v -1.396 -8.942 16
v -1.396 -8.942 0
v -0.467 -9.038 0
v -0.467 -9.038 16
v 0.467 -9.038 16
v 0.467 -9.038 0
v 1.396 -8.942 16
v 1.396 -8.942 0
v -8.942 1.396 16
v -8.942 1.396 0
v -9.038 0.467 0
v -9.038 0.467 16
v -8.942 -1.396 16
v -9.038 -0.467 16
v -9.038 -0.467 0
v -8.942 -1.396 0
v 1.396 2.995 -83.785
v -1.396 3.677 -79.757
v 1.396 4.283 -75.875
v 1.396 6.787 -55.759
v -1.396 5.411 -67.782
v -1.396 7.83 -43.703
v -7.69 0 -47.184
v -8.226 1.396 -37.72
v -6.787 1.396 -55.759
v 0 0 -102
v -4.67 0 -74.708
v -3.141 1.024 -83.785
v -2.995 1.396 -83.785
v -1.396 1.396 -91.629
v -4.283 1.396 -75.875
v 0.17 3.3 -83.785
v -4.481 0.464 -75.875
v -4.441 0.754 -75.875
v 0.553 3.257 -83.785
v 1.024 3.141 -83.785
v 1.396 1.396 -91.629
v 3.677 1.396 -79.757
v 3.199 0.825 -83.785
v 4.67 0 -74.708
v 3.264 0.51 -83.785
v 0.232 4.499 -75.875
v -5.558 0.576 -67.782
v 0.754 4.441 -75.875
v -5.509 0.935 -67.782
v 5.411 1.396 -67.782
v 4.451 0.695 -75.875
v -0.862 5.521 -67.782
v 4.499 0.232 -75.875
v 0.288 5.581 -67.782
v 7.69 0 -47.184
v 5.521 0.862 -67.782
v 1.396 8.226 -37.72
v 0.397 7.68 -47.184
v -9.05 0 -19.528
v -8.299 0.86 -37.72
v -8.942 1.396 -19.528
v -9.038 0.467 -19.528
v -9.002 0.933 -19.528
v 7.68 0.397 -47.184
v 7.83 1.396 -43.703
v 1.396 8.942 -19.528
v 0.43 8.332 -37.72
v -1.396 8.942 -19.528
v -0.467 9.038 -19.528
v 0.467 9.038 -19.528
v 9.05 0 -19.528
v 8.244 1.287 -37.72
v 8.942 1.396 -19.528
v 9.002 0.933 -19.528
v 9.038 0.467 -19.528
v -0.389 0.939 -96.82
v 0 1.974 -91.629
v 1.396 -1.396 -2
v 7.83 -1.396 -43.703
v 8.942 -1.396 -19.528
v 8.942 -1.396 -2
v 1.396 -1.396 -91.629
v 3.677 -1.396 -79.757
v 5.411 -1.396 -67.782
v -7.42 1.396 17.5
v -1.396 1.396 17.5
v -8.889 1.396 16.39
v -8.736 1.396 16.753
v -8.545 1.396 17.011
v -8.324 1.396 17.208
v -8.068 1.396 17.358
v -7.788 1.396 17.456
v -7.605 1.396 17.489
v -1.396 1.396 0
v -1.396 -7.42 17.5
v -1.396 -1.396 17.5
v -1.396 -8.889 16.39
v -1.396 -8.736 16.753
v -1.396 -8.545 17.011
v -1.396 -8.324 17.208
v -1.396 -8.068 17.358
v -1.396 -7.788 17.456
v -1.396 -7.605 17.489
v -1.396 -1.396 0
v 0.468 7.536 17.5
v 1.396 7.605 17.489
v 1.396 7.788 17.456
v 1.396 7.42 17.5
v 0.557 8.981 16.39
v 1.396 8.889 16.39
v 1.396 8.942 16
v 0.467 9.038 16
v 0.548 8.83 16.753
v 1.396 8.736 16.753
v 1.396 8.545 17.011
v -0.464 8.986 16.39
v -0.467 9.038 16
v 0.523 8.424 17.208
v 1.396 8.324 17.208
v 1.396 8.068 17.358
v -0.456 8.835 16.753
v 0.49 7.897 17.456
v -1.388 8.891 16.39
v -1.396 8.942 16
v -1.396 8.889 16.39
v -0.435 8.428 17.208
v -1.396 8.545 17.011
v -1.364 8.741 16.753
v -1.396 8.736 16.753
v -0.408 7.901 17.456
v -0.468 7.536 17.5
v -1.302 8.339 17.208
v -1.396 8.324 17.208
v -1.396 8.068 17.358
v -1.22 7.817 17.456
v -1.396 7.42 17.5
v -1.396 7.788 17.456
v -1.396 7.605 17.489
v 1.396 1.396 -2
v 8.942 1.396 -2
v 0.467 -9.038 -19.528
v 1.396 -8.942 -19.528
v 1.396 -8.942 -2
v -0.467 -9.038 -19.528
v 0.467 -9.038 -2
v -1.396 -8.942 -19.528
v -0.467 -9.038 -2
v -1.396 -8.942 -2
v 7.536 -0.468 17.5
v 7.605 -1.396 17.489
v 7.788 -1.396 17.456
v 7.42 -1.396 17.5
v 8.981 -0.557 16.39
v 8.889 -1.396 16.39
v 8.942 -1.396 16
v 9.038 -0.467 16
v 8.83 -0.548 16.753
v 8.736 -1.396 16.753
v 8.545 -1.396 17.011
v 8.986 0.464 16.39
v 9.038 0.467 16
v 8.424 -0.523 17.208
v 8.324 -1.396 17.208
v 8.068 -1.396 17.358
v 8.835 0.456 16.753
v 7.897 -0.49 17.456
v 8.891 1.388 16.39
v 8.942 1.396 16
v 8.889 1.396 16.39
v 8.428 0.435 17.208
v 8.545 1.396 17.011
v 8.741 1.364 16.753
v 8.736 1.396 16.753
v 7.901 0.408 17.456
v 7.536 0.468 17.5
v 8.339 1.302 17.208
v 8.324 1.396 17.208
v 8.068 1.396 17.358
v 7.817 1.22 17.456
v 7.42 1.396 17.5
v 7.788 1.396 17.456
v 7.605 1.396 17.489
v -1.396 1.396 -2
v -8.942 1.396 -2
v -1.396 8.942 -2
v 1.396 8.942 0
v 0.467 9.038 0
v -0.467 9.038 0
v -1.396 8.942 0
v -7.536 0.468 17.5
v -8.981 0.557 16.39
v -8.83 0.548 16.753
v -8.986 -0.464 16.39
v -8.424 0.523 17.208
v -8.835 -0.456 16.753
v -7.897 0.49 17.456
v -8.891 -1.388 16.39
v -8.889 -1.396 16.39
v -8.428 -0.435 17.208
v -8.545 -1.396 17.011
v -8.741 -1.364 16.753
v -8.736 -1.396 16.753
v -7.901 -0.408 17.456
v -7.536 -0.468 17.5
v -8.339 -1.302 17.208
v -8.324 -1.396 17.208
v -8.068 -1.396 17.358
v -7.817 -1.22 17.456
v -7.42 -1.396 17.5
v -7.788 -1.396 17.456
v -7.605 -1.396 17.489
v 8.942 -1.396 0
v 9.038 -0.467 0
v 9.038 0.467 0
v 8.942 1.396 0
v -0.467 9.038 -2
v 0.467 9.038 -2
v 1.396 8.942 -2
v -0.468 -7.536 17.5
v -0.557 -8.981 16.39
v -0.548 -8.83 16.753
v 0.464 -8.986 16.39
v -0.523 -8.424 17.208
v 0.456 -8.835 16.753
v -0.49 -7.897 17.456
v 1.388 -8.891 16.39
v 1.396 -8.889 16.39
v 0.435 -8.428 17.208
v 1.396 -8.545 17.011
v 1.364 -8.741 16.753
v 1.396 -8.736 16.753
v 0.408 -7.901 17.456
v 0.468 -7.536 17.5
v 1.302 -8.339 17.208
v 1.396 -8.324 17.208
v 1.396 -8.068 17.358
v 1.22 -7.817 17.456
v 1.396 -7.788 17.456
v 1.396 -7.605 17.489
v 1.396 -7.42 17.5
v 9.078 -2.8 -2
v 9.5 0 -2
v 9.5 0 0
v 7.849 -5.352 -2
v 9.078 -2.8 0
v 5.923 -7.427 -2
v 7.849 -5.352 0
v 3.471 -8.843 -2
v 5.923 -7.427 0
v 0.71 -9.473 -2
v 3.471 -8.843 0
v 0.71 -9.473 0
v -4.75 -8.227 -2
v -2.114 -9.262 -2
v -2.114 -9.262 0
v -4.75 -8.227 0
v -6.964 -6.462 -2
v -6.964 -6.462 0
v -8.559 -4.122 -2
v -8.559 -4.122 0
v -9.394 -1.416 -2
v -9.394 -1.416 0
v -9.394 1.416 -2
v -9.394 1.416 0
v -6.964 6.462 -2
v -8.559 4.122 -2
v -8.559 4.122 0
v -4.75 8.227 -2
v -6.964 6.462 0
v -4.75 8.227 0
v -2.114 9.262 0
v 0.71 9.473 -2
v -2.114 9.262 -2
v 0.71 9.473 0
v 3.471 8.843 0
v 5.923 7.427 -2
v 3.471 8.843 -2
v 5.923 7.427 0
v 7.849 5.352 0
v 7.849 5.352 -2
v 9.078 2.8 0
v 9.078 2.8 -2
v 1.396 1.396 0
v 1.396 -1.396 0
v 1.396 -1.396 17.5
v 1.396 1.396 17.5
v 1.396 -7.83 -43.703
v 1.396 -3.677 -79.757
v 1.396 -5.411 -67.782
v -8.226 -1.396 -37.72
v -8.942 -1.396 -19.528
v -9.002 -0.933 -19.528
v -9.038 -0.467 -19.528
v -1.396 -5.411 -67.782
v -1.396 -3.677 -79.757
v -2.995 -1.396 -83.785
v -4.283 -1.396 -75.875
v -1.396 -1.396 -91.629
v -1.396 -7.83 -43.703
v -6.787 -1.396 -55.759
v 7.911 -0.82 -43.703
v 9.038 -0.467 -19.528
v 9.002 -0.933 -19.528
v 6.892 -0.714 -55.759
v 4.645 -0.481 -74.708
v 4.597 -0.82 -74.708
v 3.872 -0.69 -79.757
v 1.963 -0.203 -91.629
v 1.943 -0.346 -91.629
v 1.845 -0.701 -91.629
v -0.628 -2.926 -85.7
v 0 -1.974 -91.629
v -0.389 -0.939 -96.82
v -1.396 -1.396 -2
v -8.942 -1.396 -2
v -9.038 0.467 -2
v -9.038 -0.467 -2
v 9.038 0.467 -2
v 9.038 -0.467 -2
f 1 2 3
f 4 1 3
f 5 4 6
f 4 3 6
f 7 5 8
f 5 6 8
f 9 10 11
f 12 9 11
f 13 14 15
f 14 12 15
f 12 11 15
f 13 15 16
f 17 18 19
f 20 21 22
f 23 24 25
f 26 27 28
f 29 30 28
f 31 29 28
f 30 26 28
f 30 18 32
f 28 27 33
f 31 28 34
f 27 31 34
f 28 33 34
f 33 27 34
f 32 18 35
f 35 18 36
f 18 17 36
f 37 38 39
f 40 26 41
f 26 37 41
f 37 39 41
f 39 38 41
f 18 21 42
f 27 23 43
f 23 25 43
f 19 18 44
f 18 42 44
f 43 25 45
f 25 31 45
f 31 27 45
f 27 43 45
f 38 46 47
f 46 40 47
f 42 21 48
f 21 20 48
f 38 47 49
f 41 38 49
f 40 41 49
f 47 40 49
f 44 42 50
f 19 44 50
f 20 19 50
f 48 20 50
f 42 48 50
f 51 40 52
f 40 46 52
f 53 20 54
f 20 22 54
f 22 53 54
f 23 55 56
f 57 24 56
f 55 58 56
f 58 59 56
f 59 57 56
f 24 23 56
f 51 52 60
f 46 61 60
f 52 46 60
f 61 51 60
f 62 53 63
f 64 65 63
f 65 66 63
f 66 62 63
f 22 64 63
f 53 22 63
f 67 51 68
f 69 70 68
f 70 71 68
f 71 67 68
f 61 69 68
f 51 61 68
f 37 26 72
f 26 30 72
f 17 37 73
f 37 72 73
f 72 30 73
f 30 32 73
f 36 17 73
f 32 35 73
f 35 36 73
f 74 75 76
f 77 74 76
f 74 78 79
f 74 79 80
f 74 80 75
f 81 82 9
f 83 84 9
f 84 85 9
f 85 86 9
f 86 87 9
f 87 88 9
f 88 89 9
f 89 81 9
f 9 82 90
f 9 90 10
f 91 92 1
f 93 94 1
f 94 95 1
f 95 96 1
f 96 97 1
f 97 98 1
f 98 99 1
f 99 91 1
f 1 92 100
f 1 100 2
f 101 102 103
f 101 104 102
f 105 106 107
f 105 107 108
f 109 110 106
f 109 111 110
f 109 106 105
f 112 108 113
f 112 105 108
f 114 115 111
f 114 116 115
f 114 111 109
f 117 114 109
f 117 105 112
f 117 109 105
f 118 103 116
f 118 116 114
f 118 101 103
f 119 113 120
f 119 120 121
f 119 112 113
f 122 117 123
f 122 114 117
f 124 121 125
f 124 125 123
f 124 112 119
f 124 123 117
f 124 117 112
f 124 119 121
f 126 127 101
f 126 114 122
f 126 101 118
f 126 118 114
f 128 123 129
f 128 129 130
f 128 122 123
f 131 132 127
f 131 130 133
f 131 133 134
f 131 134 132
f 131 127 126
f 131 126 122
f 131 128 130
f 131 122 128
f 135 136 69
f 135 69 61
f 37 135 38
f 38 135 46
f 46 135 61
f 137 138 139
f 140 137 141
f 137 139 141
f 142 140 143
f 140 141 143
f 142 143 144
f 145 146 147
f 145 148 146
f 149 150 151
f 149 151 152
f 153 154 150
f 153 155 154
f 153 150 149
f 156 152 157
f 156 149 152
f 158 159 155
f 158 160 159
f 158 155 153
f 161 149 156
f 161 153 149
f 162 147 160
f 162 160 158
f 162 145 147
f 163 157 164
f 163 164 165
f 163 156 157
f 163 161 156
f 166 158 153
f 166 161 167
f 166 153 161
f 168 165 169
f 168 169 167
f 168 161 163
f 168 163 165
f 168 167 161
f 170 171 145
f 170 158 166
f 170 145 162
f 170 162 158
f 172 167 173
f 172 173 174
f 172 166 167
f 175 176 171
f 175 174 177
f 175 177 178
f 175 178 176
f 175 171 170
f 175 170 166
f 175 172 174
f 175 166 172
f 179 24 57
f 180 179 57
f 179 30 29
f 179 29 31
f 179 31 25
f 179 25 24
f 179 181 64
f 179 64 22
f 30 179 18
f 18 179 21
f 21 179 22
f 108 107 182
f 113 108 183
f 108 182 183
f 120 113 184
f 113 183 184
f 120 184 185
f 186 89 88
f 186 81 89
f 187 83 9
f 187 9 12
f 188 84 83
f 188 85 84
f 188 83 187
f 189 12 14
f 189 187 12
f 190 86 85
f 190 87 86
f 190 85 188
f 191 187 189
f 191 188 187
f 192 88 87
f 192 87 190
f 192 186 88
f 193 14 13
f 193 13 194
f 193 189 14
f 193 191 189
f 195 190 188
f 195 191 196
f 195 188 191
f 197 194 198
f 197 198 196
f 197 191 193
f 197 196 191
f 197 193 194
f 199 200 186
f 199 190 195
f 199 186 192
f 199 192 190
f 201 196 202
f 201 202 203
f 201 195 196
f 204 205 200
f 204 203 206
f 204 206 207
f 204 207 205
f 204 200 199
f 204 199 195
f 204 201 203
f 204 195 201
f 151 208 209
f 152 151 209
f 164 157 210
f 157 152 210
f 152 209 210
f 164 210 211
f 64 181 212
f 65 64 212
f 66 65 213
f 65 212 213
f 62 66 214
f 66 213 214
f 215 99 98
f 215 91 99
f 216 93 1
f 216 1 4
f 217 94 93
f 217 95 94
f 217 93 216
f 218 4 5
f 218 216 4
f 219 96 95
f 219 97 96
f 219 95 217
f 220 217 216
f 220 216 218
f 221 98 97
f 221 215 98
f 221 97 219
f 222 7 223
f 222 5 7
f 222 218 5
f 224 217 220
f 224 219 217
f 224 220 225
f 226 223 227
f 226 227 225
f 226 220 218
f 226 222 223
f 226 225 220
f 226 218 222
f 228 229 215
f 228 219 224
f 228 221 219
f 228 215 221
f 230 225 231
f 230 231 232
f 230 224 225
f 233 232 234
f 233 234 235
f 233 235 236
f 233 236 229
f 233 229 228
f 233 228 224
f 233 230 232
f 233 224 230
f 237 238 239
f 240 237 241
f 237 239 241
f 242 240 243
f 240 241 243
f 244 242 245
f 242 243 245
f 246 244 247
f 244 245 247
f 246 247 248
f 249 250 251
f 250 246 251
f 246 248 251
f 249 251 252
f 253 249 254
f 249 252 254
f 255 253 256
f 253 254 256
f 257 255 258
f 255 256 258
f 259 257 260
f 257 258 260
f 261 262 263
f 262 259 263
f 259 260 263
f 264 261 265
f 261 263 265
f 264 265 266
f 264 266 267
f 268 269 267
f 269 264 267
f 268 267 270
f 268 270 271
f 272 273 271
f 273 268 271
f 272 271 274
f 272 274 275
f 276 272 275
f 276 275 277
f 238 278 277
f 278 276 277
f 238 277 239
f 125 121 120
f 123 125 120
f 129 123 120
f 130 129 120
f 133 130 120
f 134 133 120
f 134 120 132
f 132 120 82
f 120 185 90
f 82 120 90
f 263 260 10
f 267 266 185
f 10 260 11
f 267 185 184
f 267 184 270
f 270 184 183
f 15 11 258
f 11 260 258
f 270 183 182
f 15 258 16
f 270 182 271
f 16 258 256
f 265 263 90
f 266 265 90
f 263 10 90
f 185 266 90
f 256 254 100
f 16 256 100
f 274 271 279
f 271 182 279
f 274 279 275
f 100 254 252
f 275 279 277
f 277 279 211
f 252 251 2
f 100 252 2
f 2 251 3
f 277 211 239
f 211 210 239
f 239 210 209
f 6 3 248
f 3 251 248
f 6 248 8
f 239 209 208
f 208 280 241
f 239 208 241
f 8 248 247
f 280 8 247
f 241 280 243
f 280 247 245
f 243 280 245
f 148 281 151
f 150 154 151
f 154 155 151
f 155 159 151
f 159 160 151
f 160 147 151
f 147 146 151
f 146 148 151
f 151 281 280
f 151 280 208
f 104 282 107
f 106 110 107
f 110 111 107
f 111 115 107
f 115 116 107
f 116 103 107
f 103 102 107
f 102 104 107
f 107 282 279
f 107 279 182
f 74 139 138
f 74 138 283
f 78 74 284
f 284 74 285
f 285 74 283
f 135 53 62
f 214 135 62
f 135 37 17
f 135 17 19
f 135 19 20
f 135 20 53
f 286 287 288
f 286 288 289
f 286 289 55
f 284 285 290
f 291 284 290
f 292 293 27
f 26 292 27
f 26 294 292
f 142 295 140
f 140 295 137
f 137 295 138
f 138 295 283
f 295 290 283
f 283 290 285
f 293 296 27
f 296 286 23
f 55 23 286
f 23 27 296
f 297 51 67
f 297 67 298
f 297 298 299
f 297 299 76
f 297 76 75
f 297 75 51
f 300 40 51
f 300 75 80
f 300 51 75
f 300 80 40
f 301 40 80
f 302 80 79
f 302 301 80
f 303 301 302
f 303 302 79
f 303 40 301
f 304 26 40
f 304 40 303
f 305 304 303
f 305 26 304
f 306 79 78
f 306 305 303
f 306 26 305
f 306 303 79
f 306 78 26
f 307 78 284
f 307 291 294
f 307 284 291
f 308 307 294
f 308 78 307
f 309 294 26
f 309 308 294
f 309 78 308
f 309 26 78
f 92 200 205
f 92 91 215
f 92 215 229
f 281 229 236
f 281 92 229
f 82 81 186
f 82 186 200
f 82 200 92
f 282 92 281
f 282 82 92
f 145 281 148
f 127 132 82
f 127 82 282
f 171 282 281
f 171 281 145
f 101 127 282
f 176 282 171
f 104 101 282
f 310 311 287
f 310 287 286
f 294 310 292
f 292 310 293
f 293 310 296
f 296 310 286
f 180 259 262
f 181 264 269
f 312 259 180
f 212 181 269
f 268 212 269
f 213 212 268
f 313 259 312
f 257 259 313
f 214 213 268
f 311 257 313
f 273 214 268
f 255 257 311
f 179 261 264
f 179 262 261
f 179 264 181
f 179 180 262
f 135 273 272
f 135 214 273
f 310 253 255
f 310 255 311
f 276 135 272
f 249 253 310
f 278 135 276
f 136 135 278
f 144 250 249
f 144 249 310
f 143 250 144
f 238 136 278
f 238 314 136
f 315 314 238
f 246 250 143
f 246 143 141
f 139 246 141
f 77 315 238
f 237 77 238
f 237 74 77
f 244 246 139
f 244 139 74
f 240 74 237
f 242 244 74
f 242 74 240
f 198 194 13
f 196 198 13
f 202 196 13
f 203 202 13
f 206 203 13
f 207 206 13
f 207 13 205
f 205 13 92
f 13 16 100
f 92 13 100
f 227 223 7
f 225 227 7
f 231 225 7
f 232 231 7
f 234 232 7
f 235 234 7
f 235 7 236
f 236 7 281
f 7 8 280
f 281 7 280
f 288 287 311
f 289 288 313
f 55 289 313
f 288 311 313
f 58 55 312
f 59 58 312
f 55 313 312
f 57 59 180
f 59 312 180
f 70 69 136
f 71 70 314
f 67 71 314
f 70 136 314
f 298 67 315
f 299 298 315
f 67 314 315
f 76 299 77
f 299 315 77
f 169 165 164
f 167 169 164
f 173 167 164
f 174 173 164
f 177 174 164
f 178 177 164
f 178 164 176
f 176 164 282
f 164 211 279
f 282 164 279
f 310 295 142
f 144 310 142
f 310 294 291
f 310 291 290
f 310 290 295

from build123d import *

# Parameters (mm, degrees)
F0_R      = 9.05
F1_DEPTH  = 17.5
F2_R      = 1.5
F4_DEPTH  = 25
F5_R      = 9.5
F6_DEPTH  = 2
F7_R      = 9.05
F8_DEPTH  = 100
F10_ANGLE = 180
F12_DEPTH = 100.001


with BuildPart() as f1:
    # F0 (on Top) → F1 (new body)
    with BuildSketch(Plane.XY):
        Circle(F0_R)
    extrude(amount=F1_DEPTH)

    # F2
    f2_edges = [f1.edges().sort_by_distance(p)[0] for p in [
        (-9.05, 0, 17.5),
    ]]
    fillet(f2_edges, radius=F2_R)

    # F3 (on face) → F4 (cut)
    with BuildSketch(Plane(origin=(0, 0, 0), x_dir=(1, 0, 0), z_dir=(0, 0, -1))):
        with BuildLine():
            Line((9.05, 0), (9.05, 1.3957661577))
            Line((9.05, 1.3957661577), (8.941718897, 1.3957661577))
            ThreePointArc((8.941718897, 1.3957661577), (9.0228891165, 0.6999799933), (9.05, 0))
        make_face()
        with BuildLine():
            Line((1.3957661577, 8.941718897), (1.3957661577, 9.05))
            Line((1.3957661577, 9.05), (0, 9.05))
            ThreePointArc((0, 9.05), (0.6999799933, 9.0228891165), (1.3957661577, 8.941718897))
        make_face()
        with BuildLine():
            Line((-8.941718897, 1.3957661577), (-9.05, 1.3957661577))
            Line((-9.05, 1.3957661577), (-9.05, 0))
            ThreePointArc((-9.05, 0), (-9.0228891165, 0.6999799933), (-8.941718897, 1.3957661577))
        make_face()
        with BuildLine():
            ThreePointArc((-1.3957661577, 8.941718897), (-0.6999799933, 9.0228891165), (0, 9.05))
            Line((0, 9.05), (-1.3957661577, 9.05))
            Line((-1.3957661577, 9.05), (-1.3957661577, 8.941718897))
        make_face()
        with BuildLine():
            Line((9.05, -1.3957661577), (9.05, 0))
            ThreePointArc((9.05, 0), (9.0228891165, -0.6999799933), (8.941718897, -1.3957661577))
            Line((8.941718897, -1.3957661577), (9.05, -1.3957661577))
        make_face()
        with BuildLine():
            ThreePointArc((-8.941718897, -1.3957661577), (-9.0228891165, -0.6999799933), (-9.05, 0))
            Line((-9.05, 0), (-9.05, -1.3957661577))
            Line((-9.05, -1.3957661577), (-8.941718897, -1.3957661577))
        make_face()
        with BuildLine():
            Line((0, -9.05), (1.3957661577, -9.05))
            Line((1.3957661577, -9.05), (1.3957661577, -8.941718897))
            ThreePointArc((1.3957661577, -8.941718897), (0.6999799933, -9.0228891165), (0, -9.05))
        make_face()
        with BuildLine():
            Line((-1.3957661577, -9.05), (0, -9.05))
            ThreePointArc((0, -9.05), (-0.6999799933, -9.0228891165), (-1.3957661577, -8.941718897))
            Line((-1.3957661577, -8.941718897), (-1.3957661577, -9.05))
        make_face()
        with BuildLine():
            Line((1.3957661577, 1.3957661577), (8.941718897, 1.3957661577))
            ThreePointArc((8.941718897, 1.3957661577), (6.3993163697, 6.3993163697), (1.3957661577, 8.941718897))
            Line((1.3957661577, 8.941718897), (1.3957661577, 1.3957661577))
        make_face()
        with BuildLine():
            ThreePointArc((1.3957661577, -8.941718897), (6.3993163697, -6.3993163697), (8.941718897, -1.3957661577))
            Line((8.941718897, -1.3957661577), (1.3957661577, -1.3957661577))
            Line((1.3957661577, -1.3957661577), (1.3957661577, -8.941718897))
        make_face()
        with BuildLine():
            ThreePointArc((-8.941718897, -1.3957661577), (-6.3993163697, -6.3993163697), (-1.3957661577, -8.941718897))
            Line((-1.3957661577, -8.941718897), (-1.3957661577, -1.3957661577))
            Line((-1.3957661577, -1.3957661577), (-8.941718897, -1.3957661577))
        make_face()
        with BuildLine():
            Line((-1.3957661577, 1.3957661577), (-1.3957661577, 8.941718897))
            ThreePointArc((-1.3957661577, 8.941718897), (-6.3993163697, 6.3993163697), (-8.941718897, 1.3957661577))
            Line((-8.941718897, 1.3957661577), (-1.3957661577, 1.3957661577))
        make_face()
    extrude(amount=-F4_DEPTH, mode=Mode.SUBTRACT)

    # F5 (on face) → F6 (join)
    with BuildSketch(Plane(origin=(0, 0, 0), x_dir=(1, 0, 0), z_dir=(0, 0, -1))):
        Circle(F5_R)
    extrude(amount=F6_DEPTH)

    # F7 (on face) → F8 (join)
    with BuildSketch(Plane(origin=(0, 0, -2), x_dir=(1, 0, 0), z_dir=(0, 0, -1))):
        Circle(F7_R)
    extrude(amount=F8_DEPTH)

    # F9 (on Front) → F10 (revolve, cut)
    with BuildSketch(Plane.XZ):
        with BuildLine():
            Line((-9.05, -19.5278813041), (-9.05, -2))
            ThreePointArc((-9.05, -2), (-9.133446713, -10.7639406521), (-9.05, -19.5278813041))
        make_face()
        with BuildLine():
            Line((9.05, -2), (9.05, -19.5278813041))
            ThreePointArc((9.05, -19.5278813041), (9.133446713, -10.7639406521), (9.05, -2))
        make_face()
        with BuildLine():
            ThreePointArc((9.05, -19.5278813041), (6.38712664, -60.968279359), (0, -102))
            Line((0, -102), (9.05, -102))
            Line((9.05, -102), (9.05, -19.5278813041))
        make_face()
        with BuildLine():
            ThreePointArc((0, -102), (-6.38712664, -60.968279359), (-9.05, -19.5278813041))
            Line((-9.05, -19.5278813041), (-9.05, -102))
            Line((-9.05, -102), (0, -102))
        make_face()
    revolve(axis=Axis((0, 0, -52), (0, 0, -1)), revolution_arc=F10_ANGLE, mode=Mode.SUBTRACT)

    # F11 (on face) → F12 (cut, through all)
    with BuildSketch(Plane(origin=(0, 0, -2), x_dir=(1, 0, 0), z_dir=(0, 0, -1))):
        Polygon((-1.3957661577, -12.4198609713), (-1.3957661577, -7.4198609713), (-1.3957661577, -1.3957661577), (-7.4198609713, -1.3957661577), (-12.4198609713, -1.3957661577), align=None)
        Polygon((-12.4198609713, 1.3957661577), (-7.4198609713, 1.3957661577), (-1.3957661577, 1.3957661577), (-1.3957661577, 7.4198609713), (-1.3957661577, 12.4198609713), align=None)
        Polygon((1.3957661577, 12.4198609713), (1.3957661577, 7.4198609713), (1.3957661577, 1.3957661577), (7.4198609713, 1.3957661577), (12.4198609713, 1.3957661577), align=None)
        Polygon((12.4198609713, -1.3957661577), (7.4198609713, -1.3957661577), (1.3957661577, -1.3957661577), (1.3957661577, -7.4198609713), (1.3957661577, -12.4198609713), align=None)
    extrude(amount=F12_DEPTH, mode=Mode.SUBTRACT)


solid = f1.part
